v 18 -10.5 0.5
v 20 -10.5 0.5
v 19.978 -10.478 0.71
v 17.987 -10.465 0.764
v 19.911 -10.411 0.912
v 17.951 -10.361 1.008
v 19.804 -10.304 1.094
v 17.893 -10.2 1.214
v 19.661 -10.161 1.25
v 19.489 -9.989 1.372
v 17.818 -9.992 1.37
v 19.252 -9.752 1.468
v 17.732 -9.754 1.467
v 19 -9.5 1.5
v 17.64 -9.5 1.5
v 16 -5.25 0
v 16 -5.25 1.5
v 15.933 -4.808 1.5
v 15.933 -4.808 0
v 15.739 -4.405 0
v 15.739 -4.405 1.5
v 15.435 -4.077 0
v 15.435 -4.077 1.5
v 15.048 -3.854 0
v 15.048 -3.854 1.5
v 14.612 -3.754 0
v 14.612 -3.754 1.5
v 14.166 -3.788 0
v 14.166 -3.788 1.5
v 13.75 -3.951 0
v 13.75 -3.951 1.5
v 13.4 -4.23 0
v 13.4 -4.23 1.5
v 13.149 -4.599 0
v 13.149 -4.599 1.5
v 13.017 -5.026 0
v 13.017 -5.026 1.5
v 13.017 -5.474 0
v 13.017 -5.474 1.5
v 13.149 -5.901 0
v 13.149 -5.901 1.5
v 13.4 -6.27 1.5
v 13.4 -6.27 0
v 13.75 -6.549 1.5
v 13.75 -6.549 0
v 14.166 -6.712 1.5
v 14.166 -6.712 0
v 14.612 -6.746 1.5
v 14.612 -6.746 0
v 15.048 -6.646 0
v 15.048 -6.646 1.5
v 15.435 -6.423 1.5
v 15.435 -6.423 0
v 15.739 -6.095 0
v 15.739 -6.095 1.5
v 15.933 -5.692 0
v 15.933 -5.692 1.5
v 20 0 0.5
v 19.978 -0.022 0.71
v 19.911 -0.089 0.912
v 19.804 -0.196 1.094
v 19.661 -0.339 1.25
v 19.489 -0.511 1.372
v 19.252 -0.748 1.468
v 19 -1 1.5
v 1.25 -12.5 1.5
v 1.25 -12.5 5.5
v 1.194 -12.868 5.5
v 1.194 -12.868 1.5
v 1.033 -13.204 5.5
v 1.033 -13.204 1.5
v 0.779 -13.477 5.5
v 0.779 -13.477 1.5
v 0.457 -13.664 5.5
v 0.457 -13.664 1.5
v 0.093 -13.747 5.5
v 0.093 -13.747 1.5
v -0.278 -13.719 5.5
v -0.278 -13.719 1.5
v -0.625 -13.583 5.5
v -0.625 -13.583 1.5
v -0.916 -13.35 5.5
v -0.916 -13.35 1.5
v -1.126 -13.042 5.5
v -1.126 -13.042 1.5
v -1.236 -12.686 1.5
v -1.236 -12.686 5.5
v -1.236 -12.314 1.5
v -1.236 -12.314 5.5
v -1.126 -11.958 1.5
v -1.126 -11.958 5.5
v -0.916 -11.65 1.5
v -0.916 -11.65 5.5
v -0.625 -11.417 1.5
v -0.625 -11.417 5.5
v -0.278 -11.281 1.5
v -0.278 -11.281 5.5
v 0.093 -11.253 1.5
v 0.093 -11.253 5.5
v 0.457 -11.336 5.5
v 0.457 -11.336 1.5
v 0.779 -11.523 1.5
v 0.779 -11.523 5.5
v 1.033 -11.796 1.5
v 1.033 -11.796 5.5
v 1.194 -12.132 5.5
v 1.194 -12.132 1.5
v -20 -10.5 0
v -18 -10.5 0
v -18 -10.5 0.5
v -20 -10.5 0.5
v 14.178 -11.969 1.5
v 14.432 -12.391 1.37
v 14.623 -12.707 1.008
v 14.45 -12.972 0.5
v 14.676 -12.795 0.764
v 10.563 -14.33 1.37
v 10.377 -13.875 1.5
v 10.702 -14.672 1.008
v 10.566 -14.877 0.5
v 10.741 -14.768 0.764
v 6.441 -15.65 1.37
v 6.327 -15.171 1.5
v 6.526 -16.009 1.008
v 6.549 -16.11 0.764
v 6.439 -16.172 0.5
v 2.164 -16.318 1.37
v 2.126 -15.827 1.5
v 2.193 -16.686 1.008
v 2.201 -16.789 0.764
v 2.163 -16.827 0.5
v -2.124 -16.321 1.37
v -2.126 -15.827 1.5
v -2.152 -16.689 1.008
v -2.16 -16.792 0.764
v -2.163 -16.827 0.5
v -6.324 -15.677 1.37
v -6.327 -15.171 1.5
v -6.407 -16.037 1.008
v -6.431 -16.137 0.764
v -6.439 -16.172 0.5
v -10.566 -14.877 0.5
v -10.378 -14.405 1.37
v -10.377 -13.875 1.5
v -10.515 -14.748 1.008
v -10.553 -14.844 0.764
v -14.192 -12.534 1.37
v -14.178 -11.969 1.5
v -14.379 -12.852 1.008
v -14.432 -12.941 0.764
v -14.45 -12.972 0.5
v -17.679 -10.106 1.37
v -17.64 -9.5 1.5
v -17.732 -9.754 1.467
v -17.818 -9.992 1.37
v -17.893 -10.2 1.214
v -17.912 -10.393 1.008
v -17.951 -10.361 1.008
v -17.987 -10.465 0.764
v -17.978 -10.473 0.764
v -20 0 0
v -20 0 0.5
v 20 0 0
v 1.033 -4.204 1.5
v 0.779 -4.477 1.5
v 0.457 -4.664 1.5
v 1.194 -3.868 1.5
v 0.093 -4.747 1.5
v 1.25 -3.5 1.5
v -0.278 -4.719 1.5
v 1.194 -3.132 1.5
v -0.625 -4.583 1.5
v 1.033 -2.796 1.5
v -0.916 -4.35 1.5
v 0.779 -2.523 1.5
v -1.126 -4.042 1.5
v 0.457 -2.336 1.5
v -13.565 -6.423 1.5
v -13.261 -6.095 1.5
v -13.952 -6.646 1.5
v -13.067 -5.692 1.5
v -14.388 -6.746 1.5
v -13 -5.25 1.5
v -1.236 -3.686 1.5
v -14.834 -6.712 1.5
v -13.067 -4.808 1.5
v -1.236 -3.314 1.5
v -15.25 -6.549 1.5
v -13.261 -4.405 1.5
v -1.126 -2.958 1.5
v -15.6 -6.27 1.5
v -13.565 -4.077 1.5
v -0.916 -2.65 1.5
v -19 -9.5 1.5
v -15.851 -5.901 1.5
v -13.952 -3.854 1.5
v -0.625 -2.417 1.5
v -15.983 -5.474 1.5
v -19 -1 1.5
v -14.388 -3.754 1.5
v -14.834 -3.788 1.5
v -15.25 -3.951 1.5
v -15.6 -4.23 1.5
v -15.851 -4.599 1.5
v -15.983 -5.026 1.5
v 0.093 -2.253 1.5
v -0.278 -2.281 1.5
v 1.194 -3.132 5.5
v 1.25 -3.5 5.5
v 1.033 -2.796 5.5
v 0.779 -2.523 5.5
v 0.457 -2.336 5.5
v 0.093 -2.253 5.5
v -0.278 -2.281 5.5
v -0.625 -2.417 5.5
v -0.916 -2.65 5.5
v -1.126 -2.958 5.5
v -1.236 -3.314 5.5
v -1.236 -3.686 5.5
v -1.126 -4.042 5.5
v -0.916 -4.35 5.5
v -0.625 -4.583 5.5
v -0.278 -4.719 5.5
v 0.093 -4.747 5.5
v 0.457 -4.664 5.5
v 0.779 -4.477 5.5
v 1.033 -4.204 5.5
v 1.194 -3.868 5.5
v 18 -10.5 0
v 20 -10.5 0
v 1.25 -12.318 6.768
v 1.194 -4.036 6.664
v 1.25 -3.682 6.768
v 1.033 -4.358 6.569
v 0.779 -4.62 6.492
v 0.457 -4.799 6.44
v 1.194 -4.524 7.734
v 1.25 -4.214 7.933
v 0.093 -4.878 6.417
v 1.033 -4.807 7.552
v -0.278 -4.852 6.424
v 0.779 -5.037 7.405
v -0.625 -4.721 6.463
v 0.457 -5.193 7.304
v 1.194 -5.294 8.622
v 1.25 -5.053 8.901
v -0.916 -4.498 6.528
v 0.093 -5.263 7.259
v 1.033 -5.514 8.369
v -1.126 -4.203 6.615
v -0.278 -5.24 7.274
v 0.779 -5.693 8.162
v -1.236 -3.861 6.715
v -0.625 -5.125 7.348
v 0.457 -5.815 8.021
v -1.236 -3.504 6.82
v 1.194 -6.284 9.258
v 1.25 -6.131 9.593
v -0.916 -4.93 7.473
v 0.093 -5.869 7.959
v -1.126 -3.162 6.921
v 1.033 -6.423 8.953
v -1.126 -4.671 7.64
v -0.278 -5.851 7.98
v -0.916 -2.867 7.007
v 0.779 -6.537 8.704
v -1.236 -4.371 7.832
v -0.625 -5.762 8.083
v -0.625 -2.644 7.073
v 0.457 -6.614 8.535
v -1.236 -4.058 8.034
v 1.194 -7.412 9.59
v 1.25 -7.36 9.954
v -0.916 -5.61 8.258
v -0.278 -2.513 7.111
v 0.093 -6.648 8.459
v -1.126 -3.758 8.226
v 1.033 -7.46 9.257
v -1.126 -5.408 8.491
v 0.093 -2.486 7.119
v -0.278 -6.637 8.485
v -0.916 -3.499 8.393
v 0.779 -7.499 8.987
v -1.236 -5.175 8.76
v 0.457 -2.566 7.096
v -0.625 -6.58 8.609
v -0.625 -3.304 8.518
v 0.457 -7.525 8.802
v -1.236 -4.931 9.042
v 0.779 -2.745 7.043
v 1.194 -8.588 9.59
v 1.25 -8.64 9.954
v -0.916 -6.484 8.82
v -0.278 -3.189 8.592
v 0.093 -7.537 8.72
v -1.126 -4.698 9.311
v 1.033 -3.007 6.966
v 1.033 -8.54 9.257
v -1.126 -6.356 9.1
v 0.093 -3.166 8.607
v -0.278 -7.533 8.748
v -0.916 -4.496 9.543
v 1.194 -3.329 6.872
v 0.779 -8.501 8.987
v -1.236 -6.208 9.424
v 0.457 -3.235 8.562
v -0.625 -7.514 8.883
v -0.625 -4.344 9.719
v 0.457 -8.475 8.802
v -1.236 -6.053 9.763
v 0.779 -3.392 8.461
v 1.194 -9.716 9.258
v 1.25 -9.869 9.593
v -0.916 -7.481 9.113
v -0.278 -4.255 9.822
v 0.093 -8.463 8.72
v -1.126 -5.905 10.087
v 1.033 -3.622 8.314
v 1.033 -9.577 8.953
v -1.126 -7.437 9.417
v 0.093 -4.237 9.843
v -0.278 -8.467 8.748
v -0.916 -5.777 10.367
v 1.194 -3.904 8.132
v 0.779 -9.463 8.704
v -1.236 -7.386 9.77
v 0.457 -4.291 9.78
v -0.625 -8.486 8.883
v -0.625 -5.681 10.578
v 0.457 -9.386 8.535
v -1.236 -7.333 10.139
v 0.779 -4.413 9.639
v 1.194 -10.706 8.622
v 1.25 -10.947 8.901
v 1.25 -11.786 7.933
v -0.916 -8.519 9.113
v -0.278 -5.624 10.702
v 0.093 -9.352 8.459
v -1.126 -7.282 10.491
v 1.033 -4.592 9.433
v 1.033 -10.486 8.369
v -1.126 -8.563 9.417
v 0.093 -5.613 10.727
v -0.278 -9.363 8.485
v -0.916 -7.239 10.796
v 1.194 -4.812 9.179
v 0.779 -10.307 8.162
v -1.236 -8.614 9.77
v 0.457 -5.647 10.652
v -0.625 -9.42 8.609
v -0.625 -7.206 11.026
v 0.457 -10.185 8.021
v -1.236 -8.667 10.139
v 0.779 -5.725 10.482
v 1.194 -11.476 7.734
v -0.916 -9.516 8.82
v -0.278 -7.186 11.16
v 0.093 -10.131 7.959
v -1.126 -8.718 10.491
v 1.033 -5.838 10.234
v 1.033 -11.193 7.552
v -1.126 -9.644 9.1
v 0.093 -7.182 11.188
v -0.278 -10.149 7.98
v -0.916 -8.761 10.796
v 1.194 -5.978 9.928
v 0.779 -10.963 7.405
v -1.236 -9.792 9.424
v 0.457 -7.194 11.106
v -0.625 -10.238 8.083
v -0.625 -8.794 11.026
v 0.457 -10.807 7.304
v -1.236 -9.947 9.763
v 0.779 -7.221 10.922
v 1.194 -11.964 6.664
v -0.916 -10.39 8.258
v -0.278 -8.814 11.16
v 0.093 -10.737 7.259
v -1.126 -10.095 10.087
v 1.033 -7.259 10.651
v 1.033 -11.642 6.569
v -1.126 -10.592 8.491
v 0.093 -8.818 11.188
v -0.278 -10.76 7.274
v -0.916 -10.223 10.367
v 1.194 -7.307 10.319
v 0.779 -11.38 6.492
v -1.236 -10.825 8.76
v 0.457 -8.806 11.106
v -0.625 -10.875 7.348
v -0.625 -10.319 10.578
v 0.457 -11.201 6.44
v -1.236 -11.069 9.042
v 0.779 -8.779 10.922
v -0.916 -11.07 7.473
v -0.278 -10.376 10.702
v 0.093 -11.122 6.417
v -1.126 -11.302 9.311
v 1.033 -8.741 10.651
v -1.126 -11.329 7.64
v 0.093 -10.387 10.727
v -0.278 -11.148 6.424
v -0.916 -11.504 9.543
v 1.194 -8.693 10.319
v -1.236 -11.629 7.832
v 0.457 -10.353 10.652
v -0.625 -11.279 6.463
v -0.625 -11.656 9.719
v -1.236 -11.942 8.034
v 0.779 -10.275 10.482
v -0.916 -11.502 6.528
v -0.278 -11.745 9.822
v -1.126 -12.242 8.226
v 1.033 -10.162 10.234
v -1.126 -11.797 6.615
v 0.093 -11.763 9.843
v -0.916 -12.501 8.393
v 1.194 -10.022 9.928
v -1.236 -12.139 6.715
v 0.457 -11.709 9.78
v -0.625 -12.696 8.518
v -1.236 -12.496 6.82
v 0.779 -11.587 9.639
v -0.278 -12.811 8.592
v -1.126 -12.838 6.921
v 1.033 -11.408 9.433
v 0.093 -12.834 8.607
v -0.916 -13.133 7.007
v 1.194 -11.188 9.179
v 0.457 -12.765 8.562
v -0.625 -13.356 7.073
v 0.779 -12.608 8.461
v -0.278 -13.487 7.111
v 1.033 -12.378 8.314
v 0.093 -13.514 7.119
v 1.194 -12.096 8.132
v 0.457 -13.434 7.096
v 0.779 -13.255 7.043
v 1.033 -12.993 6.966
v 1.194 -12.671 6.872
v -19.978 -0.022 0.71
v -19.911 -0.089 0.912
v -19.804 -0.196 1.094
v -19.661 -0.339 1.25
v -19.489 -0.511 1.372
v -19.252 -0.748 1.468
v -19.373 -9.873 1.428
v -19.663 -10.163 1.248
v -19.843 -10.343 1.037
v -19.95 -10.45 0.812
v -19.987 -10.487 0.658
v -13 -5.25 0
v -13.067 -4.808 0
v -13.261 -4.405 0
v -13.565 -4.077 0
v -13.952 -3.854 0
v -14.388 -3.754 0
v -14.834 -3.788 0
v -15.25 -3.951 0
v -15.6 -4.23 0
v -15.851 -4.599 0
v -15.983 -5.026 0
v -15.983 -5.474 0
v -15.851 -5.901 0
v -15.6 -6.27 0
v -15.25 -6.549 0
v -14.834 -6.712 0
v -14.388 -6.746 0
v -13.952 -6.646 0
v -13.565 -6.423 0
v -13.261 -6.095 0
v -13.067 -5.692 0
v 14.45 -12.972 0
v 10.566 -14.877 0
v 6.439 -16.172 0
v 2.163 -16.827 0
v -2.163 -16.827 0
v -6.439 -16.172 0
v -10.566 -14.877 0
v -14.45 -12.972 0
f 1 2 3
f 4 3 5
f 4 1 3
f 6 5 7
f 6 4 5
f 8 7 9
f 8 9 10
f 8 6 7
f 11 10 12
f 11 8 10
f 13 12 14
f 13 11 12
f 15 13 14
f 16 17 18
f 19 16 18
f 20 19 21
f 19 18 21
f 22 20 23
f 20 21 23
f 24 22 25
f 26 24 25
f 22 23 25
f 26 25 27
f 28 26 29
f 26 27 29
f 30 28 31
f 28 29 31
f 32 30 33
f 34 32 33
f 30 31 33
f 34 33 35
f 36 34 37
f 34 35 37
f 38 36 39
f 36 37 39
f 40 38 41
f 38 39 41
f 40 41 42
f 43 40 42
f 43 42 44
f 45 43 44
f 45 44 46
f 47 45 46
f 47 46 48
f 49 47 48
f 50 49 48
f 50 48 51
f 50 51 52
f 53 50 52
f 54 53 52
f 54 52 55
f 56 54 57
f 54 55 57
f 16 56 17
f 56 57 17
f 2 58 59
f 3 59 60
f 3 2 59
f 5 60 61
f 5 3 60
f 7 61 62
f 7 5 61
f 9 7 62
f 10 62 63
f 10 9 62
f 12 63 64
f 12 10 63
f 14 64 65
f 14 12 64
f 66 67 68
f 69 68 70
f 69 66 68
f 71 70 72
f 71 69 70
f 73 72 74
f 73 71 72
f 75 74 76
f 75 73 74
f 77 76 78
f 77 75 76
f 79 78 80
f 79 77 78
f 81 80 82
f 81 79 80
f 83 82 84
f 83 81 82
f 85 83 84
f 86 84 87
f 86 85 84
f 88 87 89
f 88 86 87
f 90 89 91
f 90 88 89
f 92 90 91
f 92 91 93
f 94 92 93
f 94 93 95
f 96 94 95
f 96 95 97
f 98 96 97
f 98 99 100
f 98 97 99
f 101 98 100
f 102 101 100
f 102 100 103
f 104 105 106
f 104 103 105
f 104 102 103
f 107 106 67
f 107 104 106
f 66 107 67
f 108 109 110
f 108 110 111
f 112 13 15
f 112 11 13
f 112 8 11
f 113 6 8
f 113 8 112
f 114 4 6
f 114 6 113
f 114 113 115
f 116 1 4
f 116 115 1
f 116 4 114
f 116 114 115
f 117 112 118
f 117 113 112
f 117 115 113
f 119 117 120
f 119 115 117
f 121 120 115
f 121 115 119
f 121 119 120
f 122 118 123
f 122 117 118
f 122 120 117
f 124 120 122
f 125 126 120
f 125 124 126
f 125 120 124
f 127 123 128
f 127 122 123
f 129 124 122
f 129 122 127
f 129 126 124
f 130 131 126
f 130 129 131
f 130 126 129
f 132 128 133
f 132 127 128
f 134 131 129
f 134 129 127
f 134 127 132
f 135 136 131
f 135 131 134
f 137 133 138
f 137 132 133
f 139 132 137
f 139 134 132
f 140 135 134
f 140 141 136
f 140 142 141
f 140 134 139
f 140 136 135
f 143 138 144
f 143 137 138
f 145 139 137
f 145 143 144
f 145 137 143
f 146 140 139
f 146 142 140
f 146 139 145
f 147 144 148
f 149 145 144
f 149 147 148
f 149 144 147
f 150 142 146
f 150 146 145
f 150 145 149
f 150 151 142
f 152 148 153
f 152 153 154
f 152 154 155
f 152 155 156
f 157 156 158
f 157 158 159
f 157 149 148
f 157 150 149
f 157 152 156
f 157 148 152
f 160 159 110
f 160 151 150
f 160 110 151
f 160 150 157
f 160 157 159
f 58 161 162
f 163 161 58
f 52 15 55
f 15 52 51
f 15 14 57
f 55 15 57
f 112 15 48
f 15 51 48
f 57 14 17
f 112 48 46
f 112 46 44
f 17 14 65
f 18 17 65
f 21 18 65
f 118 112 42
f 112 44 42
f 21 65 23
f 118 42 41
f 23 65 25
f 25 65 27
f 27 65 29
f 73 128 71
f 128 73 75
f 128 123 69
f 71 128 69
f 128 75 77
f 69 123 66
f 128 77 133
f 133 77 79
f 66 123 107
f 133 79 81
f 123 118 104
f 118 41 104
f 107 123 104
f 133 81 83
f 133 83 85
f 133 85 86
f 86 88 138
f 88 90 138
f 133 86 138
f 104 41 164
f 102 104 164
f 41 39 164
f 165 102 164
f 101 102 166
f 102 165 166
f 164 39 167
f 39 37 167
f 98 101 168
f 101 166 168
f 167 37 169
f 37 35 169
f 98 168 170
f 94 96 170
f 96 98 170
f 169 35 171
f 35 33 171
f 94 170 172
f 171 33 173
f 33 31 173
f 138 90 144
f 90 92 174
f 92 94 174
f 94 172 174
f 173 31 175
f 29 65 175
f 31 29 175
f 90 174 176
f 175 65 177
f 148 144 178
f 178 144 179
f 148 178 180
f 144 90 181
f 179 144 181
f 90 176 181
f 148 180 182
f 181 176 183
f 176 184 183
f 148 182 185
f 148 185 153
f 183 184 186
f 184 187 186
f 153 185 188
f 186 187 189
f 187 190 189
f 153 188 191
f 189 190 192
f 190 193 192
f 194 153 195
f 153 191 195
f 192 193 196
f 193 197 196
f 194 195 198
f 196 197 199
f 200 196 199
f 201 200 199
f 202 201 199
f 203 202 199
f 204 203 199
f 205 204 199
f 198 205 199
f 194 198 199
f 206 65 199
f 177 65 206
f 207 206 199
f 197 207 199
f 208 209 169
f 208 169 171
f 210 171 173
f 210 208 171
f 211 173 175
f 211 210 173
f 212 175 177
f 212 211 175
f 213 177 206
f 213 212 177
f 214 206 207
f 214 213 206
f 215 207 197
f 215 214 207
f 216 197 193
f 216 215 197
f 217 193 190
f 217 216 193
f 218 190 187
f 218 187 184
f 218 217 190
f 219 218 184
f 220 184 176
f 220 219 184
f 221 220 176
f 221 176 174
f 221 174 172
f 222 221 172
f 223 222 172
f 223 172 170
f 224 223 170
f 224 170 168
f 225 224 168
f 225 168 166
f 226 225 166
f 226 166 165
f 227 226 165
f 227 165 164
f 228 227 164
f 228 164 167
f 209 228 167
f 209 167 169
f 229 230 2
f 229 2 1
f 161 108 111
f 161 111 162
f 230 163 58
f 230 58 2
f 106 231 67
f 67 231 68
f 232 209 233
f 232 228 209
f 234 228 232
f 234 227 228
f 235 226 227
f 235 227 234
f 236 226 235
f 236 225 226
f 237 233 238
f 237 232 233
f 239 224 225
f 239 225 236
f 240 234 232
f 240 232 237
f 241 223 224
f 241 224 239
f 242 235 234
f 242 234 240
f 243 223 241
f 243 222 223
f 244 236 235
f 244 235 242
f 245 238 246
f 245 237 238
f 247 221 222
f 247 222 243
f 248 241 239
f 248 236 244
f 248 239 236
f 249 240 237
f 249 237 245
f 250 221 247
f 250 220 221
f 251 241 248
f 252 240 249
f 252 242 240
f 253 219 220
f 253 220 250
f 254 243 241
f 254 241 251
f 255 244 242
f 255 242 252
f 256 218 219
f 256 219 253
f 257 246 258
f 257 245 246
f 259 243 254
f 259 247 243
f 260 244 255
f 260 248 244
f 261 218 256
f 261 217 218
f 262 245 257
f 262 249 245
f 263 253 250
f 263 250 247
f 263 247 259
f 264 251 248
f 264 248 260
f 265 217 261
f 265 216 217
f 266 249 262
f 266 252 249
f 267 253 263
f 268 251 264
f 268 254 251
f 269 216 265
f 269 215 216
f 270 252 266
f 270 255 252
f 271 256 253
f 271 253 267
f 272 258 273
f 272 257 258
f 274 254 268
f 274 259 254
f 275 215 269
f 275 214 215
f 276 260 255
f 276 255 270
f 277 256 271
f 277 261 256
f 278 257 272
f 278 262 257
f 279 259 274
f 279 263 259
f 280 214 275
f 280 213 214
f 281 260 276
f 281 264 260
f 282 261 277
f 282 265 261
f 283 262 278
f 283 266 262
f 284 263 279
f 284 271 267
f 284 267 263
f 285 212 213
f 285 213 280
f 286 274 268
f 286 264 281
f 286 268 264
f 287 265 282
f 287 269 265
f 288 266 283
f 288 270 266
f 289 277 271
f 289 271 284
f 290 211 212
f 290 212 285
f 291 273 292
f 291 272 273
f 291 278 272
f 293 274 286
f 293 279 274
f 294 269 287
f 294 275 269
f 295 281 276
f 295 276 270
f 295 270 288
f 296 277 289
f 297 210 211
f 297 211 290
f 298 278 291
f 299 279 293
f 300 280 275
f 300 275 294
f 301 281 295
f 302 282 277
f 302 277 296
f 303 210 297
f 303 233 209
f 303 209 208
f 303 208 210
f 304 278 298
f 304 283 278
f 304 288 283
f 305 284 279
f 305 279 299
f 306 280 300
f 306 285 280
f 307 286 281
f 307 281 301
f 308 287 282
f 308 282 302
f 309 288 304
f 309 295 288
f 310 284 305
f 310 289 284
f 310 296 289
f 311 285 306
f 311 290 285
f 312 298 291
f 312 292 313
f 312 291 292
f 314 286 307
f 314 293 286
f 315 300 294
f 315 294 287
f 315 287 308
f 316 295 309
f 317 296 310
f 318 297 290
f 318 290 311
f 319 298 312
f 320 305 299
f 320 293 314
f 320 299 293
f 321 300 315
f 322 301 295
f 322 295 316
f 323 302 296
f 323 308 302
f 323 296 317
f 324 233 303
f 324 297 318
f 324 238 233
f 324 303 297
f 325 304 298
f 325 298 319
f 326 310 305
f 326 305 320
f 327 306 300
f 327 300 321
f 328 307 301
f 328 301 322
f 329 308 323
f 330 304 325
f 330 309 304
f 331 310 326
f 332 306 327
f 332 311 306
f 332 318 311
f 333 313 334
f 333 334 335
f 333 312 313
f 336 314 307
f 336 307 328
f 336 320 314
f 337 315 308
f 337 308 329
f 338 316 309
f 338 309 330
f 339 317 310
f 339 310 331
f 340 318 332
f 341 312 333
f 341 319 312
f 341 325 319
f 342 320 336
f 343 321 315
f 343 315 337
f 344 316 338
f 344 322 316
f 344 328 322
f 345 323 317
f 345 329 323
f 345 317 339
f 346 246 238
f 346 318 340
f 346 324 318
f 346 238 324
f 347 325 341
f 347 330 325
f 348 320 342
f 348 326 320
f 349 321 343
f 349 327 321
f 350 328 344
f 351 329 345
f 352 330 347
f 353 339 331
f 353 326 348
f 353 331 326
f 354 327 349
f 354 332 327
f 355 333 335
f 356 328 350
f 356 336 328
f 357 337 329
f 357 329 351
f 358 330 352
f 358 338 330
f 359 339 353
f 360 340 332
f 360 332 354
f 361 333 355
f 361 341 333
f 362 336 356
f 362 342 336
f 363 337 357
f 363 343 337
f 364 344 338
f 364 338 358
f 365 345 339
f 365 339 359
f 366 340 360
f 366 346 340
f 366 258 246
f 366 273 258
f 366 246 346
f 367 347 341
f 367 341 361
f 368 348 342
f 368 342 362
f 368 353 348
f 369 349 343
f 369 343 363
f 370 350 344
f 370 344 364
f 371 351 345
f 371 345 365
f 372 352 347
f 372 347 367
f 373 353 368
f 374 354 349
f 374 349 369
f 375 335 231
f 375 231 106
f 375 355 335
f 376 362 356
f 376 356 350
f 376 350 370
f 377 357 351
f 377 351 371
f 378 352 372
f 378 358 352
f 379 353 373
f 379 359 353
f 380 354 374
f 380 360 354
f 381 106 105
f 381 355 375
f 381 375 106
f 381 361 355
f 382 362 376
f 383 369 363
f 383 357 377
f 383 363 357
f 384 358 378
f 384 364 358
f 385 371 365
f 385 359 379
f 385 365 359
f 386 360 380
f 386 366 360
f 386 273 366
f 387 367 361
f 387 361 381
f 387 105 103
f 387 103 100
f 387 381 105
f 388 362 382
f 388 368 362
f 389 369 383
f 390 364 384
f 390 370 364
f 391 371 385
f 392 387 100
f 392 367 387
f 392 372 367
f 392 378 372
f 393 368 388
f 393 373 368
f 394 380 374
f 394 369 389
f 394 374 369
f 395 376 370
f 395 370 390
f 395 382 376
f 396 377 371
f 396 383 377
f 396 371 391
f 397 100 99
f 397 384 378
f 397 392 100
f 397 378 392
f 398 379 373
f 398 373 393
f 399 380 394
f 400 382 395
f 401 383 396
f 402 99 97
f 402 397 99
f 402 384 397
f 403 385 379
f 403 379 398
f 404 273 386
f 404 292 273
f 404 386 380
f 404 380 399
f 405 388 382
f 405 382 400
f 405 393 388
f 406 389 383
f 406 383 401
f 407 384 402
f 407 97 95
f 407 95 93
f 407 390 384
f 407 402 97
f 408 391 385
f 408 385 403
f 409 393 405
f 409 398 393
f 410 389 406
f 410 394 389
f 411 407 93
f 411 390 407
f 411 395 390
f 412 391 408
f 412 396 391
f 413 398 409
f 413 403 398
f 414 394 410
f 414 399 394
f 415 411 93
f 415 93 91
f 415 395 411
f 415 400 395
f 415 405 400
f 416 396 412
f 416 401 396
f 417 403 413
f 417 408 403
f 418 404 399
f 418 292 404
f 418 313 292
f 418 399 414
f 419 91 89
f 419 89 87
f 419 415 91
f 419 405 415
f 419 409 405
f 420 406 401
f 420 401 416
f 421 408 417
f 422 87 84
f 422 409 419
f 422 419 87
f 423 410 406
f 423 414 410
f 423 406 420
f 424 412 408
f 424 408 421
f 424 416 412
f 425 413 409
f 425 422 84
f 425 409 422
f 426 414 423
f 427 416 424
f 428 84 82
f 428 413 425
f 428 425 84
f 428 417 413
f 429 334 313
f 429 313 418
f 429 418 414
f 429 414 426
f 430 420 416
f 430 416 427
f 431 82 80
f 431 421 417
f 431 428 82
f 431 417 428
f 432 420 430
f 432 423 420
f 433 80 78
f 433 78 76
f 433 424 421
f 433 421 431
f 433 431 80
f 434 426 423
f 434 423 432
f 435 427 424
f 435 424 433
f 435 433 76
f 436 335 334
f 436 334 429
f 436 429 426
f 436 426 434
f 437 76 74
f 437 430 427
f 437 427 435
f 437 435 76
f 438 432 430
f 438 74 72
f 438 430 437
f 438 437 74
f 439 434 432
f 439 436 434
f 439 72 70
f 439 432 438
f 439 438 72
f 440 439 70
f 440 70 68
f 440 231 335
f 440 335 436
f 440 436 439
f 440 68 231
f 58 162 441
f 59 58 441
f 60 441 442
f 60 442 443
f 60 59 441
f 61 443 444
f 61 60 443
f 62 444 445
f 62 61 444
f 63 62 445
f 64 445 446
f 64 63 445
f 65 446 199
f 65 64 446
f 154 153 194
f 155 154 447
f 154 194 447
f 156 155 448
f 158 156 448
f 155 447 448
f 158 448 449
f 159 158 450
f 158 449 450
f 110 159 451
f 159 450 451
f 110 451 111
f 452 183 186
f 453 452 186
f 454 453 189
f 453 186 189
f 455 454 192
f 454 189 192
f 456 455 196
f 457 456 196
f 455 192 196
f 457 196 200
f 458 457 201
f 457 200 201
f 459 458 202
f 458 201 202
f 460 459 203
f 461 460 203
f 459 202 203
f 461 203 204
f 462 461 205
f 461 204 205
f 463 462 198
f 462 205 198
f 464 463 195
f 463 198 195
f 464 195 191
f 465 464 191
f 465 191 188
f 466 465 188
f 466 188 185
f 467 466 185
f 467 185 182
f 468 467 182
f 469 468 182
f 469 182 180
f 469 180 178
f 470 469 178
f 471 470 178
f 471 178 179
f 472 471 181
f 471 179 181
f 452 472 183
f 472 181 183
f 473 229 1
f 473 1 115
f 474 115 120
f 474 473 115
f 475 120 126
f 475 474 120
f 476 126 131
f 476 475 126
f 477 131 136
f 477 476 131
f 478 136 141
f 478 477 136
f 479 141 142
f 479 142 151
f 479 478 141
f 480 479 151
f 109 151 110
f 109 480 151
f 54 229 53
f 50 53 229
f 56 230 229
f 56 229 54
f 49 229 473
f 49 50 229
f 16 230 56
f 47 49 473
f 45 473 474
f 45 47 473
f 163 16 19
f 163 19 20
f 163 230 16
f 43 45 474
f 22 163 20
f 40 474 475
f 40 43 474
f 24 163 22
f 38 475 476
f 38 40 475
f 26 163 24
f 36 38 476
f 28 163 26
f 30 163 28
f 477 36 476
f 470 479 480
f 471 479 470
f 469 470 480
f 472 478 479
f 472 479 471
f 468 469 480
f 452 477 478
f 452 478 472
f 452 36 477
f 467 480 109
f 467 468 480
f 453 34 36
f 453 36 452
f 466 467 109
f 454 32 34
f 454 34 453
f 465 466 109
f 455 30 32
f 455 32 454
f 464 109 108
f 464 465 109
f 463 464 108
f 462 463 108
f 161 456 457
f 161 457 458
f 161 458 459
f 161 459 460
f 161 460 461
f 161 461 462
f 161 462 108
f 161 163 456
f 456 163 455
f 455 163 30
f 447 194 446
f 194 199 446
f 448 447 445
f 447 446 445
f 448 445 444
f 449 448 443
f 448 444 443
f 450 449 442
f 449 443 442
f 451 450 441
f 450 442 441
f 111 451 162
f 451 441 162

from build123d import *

# Parameters (mm, degrees)
BOSS_EXTRUDE1_DEPTH = 1.5
SKETCH2_R           = 1.5
CUT_EXTRUDE1_DEPTH  = 1.5
SKETCH3_R           = 1.25
FILLET1_R           = 1


with BuildPart() as part:
    # Sketch1 → Boss-Extrude1 (new body)
    with BuildSketch(Plane.XY):
        with BuildLine():
            Line((0, 0), (20, 0))
            Line((20, 0), (20, -10.5))
            Line((20, -10.5), (18, -10.5))
            ThreePointArc((18, -10.5), (0, -16.9094223), (-18, -10.5))
            Line((-18, -10.5), (-20, -10.5))
            Line((-20, -10.5), (-20, 0))
            Line((-20, 0), (0, 0))
        make_face()
    extrude(amount=BOSS_EXTRUDE1_DEPTH)

    # Sketch2 → Cut-Extrude1 (cut)
    with BuildSketch(Plane.XY.offset(1.5)):
        with Locations((-14.5, -5.25)):
            Circle(SKETCH2_R)
        with Locations((14.5, -5.25)):
            Circle(SKETCH2_R)
    extrude(amount=-CUT_EXTRUDE1_DEPTH, mode=Mode.SUBTRACT)

    # Sweep2: sweep along a path in Sketch4
    with BuildLine(Plane(origin=(0, 0, 0), x_dir=(0, 0, -1), z_dir=(1, 0, 0))) as sweep2_path:
        Line((-1.5, -3.5), (-5.5, -3.5))
        ThreePointArc((-5.5, -3.5), (-10, -8), (-5.5, -12.5))
        Line((-5.5, -12.5), (-1.5, -12.5))
    # Sketch3 → Sweep2 (sweep)
    with BuildSketch(Plane.XY.offset(1.5)):
        with Locations((0, -12.5)):
            Circle(SKETCH3_R)
    sweep(path=sweep2_path.line)

    # Fillet1
    fillet1_edges = [part.edges().sort_by_distance(p)[0] for p in [
        (-19, -10.5, 1.5),
        (0, -16.9094223, 1.5),
        (19, -10.5, 1.5),
        (20, -5.25, 1.5),
        (0, 0, 1.5),
        (-20, -5.25, 1.5),
    ]]
    fillet(fillet1_edges, radius=FILLET1_R)


solid = part.part
